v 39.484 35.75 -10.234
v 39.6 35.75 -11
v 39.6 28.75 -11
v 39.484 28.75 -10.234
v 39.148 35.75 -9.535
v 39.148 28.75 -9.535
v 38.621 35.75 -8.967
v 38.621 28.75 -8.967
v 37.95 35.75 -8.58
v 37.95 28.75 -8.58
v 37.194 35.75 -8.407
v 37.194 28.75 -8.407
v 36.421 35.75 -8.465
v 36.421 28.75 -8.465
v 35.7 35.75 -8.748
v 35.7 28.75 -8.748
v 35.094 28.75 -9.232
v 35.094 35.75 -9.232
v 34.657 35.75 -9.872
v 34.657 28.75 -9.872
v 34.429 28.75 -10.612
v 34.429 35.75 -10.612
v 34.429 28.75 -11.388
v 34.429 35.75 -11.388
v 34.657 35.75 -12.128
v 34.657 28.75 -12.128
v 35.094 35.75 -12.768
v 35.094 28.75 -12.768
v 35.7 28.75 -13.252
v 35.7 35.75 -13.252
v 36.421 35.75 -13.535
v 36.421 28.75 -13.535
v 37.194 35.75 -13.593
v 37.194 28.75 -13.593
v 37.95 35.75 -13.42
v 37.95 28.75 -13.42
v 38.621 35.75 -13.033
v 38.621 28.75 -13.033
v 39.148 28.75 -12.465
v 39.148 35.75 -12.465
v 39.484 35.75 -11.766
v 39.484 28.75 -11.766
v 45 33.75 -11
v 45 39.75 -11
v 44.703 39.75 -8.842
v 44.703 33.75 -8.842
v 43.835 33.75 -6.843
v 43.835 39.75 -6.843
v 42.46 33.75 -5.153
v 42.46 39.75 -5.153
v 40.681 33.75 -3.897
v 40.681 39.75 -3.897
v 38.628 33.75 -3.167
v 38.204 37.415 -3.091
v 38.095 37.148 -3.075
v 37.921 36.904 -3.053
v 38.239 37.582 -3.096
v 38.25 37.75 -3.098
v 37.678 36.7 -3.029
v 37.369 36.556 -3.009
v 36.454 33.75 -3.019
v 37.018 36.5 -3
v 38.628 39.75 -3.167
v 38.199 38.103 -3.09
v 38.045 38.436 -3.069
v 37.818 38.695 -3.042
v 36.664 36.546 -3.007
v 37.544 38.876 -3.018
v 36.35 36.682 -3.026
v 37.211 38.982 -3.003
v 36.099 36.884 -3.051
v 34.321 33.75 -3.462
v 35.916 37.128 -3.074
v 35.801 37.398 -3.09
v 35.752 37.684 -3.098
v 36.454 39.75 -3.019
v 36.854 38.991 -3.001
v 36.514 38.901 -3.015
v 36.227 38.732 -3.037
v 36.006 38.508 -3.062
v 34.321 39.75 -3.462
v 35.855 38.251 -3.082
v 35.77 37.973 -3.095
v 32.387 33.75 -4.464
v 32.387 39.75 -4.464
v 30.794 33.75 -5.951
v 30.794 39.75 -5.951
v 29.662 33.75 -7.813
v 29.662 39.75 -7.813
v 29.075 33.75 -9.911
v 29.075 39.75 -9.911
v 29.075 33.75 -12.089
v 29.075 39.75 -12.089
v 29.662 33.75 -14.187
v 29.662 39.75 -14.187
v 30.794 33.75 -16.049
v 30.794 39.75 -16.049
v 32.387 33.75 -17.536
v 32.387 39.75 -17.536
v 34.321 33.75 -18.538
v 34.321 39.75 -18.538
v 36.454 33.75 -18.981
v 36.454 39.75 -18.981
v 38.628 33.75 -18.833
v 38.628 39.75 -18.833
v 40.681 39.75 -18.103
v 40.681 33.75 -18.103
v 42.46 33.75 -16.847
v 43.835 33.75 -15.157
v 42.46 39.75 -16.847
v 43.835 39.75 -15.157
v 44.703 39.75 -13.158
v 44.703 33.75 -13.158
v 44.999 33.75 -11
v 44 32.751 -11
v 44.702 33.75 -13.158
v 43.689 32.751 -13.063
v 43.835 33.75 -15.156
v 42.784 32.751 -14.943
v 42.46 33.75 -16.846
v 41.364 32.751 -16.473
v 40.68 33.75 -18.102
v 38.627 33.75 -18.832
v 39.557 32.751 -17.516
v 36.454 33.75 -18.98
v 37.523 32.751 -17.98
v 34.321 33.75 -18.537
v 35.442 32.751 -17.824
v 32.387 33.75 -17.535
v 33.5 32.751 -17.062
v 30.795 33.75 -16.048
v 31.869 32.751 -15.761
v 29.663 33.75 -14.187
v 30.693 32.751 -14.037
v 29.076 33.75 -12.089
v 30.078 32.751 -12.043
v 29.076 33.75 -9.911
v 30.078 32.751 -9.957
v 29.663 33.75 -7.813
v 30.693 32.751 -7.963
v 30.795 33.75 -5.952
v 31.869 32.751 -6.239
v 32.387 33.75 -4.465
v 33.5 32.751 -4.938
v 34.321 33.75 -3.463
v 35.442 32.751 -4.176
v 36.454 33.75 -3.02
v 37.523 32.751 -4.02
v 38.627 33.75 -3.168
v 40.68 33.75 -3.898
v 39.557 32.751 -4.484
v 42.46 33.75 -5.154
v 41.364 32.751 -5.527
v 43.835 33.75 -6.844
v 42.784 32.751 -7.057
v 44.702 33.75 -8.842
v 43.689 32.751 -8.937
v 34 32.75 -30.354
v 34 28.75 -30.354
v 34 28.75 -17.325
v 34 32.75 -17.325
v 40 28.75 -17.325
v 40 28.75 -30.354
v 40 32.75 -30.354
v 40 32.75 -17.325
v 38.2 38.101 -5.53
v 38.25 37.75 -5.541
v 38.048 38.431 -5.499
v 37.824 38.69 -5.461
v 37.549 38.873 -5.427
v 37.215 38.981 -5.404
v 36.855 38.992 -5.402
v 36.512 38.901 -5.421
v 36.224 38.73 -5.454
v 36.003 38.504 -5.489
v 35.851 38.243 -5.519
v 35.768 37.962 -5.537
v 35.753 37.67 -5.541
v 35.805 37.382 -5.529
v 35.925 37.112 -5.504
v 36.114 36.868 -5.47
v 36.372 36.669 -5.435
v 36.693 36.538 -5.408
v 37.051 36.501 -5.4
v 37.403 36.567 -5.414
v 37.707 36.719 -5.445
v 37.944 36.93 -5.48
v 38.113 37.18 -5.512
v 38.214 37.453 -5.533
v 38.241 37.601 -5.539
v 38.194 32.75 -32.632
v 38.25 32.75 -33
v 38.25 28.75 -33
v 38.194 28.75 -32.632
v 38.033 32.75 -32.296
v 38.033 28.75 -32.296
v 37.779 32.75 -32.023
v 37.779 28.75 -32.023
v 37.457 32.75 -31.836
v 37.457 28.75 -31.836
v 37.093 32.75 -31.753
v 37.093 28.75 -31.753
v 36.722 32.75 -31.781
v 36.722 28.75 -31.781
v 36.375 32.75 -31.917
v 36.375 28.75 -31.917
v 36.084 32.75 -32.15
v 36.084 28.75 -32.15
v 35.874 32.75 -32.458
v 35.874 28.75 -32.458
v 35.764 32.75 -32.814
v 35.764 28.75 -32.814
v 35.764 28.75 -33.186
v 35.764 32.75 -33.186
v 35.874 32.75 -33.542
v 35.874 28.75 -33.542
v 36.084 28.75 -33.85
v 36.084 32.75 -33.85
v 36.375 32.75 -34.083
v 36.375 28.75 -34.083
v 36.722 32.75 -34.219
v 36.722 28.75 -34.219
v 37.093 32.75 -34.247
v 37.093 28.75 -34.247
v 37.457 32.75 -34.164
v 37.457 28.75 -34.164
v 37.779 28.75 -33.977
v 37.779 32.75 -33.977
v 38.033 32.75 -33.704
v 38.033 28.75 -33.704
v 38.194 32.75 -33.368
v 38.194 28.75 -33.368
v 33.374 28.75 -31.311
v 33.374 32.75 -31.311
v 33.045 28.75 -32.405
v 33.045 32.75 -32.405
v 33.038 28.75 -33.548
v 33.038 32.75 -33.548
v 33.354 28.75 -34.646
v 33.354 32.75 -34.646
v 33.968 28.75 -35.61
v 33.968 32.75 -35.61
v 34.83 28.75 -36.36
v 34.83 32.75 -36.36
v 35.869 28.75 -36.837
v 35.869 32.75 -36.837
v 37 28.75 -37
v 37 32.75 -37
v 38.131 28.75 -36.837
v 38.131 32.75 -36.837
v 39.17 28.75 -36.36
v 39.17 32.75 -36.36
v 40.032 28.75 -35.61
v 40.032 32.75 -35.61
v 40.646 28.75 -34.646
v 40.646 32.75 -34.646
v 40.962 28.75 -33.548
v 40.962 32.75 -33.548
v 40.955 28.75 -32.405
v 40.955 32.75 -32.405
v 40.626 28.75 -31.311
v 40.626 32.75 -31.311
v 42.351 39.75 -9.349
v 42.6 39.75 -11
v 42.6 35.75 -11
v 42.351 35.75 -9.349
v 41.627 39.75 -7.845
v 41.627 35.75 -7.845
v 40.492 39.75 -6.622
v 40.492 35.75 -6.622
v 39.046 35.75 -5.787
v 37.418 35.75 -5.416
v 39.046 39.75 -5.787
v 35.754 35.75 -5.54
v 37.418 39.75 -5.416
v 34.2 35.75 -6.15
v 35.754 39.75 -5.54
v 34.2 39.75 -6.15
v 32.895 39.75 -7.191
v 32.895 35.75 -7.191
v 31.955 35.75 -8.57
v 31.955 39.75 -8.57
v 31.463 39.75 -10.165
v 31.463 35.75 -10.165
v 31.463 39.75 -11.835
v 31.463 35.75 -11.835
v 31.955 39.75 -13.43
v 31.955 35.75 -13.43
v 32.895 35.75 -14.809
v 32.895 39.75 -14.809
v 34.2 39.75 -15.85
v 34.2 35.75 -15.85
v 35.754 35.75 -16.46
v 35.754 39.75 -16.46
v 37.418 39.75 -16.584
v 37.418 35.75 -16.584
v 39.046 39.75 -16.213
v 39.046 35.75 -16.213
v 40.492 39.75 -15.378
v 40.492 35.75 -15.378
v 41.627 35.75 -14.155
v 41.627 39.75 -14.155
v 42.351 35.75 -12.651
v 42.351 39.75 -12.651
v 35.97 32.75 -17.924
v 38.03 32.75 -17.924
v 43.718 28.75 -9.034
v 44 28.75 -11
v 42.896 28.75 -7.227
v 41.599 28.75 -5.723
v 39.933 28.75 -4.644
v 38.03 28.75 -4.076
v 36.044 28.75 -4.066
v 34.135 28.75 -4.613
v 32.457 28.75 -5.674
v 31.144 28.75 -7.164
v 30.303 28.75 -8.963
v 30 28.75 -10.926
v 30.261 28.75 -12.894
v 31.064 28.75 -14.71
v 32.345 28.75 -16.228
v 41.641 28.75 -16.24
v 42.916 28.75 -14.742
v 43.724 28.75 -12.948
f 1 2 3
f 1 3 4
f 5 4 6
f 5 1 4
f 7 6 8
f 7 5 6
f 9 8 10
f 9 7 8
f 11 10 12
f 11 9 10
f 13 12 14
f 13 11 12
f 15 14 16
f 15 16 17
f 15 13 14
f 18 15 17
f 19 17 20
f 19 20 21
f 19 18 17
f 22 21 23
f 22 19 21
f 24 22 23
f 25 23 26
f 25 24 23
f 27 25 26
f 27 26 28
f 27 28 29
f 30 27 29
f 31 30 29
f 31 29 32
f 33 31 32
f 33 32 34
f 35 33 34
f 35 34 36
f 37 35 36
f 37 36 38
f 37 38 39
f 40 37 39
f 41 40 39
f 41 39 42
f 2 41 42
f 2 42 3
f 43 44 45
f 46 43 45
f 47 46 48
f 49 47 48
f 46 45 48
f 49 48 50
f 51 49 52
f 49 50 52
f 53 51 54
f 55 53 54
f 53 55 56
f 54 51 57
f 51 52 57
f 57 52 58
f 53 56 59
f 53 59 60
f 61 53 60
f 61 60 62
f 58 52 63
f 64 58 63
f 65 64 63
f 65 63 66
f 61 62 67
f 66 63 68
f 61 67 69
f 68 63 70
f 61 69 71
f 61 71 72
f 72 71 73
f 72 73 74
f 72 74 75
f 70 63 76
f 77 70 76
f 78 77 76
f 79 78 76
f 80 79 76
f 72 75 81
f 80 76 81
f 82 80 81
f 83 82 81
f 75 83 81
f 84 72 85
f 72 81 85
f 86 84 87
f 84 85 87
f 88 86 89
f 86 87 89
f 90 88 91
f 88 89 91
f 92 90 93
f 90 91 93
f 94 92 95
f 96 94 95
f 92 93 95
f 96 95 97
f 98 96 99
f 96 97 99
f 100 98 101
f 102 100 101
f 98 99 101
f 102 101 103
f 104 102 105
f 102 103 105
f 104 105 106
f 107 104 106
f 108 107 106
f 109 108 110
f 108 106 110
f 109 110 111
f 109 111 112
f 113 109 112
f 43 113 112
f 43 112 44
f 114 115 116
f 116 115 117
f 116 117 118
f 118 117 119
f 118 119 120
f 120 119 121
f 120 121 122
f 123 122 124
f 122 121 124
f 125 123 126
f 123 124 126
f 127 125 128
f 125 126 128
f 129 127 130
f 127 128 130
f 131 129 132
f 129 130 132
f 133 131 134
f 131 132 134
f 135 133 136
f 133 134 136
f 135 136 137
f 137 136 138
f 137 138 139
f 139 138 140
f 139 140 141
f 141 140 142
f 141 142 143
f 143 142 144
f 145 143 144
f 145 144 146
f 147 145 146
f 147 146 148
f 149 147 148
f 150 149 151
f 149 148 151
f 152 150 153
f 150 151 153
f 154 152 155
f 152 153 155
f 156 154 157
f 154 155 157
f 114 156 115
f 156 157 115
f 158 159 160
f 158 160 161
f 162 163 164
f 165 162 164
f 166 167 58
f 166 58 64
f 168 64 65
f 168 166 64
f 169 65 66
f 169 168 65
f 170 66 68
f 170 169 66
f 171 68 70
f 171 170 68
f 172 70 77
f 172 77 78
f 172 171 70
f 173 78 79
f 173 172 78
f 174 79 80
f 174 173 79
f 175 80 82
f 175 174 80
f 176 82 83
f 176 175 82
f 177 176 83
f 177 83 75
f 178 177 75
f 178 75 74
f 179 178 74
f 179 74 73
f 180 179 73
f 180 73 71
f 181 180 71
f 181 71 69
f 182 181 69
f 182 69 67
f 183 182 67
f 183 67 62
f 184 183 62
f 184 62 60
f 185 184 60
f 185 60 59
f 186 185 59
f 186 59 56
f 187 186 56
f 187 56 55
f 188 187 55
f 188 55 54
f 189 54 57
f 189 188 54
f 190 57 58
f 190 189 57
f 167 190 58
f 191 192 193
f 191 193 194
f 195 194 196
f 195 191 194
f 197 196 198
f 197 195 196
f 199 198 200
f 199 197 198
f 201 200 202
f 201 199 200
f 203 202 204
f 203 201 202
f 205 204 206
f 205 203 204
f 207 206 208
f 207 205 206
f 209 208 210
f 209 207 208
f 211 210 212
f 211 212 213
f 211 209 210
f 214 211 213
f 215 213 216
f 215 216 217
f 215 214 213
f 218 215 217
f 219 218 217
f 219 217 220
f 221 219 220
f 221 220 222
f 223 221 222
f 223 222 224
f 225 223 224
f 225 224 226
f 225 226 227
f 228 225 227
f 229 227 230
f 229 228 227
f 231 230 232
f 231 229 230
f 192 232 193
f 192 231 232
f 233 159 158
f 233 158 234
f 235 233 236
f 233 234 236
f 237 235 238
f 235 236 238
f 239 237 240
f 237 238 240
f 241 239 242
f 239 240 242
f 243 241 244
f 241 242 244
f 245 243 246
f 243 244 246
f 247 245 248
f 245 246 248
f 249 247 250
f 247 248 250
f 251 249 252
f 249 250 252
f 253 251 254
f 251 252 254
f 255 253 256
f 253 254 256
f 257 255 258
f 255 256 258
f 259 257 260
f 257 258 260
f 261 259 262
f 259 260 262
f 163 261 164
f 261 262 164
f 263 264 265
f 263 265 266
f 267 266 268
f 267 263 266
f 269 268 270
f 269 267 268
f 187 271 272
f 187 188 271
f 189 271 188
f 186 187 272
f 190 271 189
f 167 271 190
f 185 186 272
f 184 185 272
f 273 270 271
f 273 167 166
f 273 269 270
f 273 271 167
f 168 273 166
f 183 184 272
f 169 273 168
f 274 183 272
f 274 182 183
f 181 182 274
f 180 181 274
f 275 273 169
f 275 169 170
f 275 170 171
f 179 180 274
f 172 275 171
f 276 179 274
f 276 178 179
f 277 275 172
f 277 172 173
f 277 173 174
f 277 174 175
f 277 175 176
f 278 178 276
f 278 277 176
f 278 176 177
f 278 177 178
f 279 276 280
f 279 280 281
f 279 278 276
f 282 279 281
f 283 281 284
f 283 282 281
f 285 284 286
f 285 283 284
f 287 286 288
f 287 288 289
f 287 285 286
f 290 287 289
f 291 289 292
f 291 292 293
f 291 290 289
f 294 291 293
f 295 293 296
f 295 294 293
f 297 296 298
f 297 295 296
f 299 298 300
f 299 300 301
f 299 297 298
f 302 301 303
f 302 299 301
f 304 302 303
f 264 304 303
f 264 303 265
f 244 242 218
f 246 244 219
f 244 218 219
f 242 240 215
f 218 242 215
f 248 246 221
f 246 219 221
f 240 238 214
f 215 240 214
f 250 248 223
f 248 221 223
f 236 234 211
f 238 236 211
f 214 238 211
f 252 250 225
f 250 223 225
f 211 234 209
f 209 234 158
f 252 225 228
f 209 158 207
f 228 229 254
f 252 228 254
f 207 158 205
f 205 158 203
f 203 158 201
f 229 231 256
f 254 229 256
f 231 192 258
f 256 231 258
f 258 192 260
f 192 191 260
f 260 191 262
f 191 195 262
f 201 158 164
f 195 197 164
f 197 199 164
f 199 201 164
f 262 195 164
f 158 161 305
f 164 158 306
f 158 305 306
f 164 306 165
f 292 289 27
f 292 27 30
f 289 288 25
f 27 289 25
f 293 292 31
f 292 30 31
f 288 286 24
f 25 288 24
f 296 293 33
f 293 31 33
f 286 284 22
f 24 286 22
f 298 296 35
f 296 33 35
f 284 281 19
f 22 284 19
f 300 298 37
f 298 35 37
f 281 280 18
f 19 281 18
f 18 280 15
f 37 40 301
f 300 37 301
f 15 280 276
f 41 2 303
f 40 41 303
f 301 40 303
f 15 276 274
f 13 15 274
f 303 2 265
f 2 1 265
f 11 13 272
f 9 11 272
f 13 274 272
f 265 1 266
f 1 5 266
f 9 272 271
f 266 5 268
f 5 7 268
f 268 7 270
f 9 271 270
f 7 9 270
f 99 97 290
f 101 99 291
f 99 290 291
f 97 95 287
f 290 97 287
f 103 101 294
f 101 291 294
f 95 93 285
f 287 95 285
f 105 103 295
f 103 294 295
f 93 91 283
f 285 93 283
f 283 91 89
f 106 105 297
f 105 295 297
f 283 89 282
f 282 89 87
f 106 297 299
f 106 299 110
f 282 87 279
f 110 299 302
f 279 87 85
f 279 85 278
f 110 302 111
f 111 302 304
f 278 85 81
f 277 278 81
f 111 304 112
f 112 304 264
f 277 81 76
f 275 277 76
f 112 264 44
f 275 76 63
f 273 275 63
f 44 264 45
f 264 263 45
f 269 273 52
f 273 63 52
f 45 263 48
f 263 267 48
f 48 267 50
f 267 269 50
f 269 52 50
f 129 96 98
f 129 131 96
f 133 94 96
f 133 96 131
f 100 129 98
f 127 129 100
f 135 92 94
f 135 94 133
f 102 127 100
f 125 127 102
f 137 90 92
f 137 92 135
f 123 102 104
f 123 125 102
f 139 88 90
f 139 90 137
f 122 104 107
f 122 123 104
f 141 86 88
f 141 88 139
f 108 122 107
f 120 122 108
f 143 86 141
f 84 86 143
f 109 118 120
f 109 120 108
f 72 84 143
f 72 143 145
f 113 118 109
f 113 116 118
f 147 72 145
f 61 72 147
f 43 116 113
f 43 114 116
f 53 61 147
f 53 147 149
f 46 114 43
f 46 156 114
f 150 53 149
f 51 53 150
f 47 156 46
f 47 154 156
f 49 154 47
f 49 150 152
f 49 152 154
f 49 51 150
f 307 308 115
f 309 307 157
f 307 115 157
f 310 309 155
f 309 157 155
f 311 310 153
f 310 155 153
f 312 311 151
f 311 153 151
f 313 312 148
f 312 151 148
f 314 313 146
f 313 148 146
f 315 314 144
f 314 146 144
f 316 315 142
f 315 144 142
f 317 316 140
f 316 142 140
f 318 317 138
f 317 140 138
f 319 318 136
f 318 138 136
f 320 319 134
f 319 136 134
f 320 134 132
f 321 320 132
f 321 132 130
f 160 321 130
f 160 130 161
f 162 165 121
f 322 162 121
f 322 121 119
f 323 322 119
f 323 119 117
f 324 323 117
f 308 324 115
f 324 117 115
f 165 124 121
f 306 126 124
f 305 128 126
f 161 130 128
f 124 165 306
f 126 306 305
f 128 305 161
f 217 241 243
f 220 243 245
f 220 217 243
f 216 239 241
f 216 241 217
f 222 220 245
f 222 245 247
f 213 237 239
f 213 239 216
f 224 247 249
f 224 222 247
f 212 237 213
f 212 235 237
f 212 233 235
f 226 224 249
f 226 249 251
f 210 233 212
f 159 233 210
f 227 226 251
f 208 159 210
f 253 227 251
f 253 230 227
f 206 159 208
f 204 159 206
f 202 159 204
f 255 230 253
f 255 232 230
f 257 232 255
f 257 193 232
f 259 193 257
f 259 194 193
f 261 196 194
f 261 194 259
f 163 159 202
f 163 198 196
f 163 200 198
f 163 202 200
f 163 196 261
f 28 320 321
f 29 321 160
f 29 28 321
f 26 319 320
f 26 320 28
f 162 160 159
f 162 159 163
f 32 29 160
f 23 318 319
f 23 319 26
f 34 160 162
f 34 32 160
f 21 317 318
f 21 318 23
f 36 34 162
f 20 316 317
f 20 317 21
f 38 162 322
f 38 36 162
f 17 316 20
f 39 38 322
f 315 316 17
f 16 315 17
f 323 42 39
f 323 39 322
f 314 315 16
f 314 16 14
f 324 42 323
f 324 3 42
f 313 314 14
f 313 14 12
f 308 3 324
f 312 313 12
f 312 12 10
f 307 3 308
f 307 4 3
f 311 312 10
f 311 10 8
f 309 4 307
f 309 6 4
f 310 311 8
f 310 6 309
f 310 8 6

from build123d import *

# Parameters (mm, degrees)
CYLINDER968_R          = 1.25
CYLINDER968_DEPTH      = 4
CYLINDER968_ROLL_ANGLE = 90
CYLINDER972_R          = 1.25
CYLINDER972_DEPTH      = 7
CYLINDER970_R          = 2.6
CYLINDER970_DEPTH      = 11
CYLINDER970_ROLL_ANGLE = 90
CYLINDER969_R          = 5.6
CYLINDER969_DEPTH      = 4
CYLINDER969_ROLL_ANGLE = 90
CYLINDER971_R          = 8
CYLINDER971_DEPTH      = 6
CYLINDER971_ROLL_ANGLE = 90
CYLINDER964_R          = 7
CYLINDER964_DEPTH      = 6
CYLINDER964_ROLL_ANGLE = 90
CYLINDER965_R          = 4
CYLINDER965_DEPTH      = 4
CYLINDER965_ROLL_ANGLE = 90
BOX564_W               = 6
BOX564_H               = 4
BOX564_DEPTH           = 22
CHAMFER105_SIZE        = 0.999


with BuildPart() as cylinder1140:
    # Cylinder968 → Cylinder968 (new body)
    with BuildSketch(Plane.XY):
        Circle(CYLINDER968_R)
    extrude(amount=CYLINDER968_DEPTH)


with BuildPart() as cylinder1140_1:
    # Cylinder968 roll: moved
    add(cylinder1140.part.rotate(Axis((0, 0, 0), (1, 0, 0)), CYLINDER968_ROLL_ANGLE))


with BuildPart() as cylinder1140_2:
    # Cylinder968 placement: moved
    add(cylinder1140_1.part.moved(Location((37, 32.75, -33))))


with BuildPart() as cylinder1144:
    # Cylinder972 → Cylinder972 (new body)
    with BuildSketch(Plane(origin=(37, 37.75, -8), x_dir=(1, 0, 0), z_dir=(0, 0, 1))):
        Circle(CYLINDER972_R)
    extrude(amount=CYLINDER972_DEPTH)


with BuildPart() as cylinder1142:
    # Cylinder970 → Cylinder970 (new body)
    with BuildSketch(Plane.XY):
        Circle(CYLINDER970_R)
    extrude(amount=CYLINDER970_DEPTH)


with BuildPart() as cylinder1142_1:
    # Cylinder970 roll: moved
    add(cylinder1142.part.rotate(Axis((0, 0, 0), (1, 0, 0)), CYLINDER970_ROLL_ANGLE))


with BuildPart() as cylinder1142_2:
    # Cylinder970 placement: moved
    add(cylinder1142_1.part.moved(Location((37, 39.75, -11))))


with BuildPart() as fusion607:
    # Cylinder969 → Cylinder969 (new body)
    with BuildSketch(Plane.XY):
        Circle(CYLINDER969_R)
    extrude(amount=CYLINDER969_DEPTH)


with BuildPart() as fusion607_1:
    # Cylinder969 roll: moved
    add(fusion607.part.rotate(Axis((0, 0, 0), (1, 0, 0)), CYLINDER969_ROLL_ANGLE))


with BuildPart() as fusion607_2:
    # Cylinder969 placement: moved
    add(fusion607_1.part.moved(Location((37, 39.75, -11))))

    # Fusion607: union Cylinder1140, Cylinder1144, Cylinder1142
    add(cylinder1140_2.part)
    add(cylinder1144.part)
    add(cylinder1142_2.part)


with BuildPart() as cylinder1143:
    # Cylinder971 → Cylinder971 (new body)
    with BuildSketch(Plane.XY):
        Circle(CYLINDER971_R)
    extrude(amount=CYLINDER971_DEPTH)


with BuildPart() as cylinder1143_1:
    # Cylinder971 roll: moved
    add(cylinder1143.part.rotate(Axis((0, 0, 0), (1, 0, 0)), CYLINDER971_ROLL_ANGLE))


with BuildPart() as cylinder1143_2:
    # Cylinder971 placement: moved
    add(cylinder1143_1.part.moved(Location((37, 39.75, -11))))


with BuildPart() as cylinder1136:
    # Cylinder964 → Cylinder964 (new body)
    with BuildSketch(Plane.XY):
        Circle(CYLINDER964_R)
    extrude(amount=CYLINDER964_DEPTH)


with BuildPart() as cylinder1136_1:
    # Cylinder964 roll: moved
    add(cylinder1136.part.rotate(Axis((0, 0, 0), (1, 0, 0)), CYLINDER964_ROLL_ANGLE))


with BuildPart() as cylinder1136_2:
    # Cylinder964 placement: moved
    add(cylinder1136_1.part.moved(Location((37, 39.75, -11))))


with BuildPart() as cylinder1137:
    # Cylinder965 → Cylinder965 (new body)
    with BuildSketch(Plane.XY):
        Circle(CYLINDER965_R)
    extrude(amount=CYLINDER965_DEPTH)


with BuildPart() as cylinder1137_1:
    # Cylinder965 roll: moved
    add(cylinder1137.part.rotate(Axis((0, 0, 0), (1, 0, 0)), CYLINDER965_ROLL_ANGLE))


with BuildPart() as cylinder1137_2:
    # Cylinder965 placement: moved
    add(cylinder1137_1.part.moved(Location((37, 37.75, -33))))


with BuildPart() as front_axle_steering_arm:
    # Box564 → Box564 (new body)
    with BuildSketch(Plane(origin=(34, 33.75, -33), x_dir=(1, 0, 0), z_dir=(0, 0, 1))):
        with Locations((3, 2)):
            Rectangle(BOX564_W, BOX564_H)
    extrude(amount=BOX564_DEPTH)

    # Fusion608: union Cylinder1136, Cylinder1137
    add(cylinder1136_2.part)
    add(cylinder1137_2.part)


with BuildPart() as front_axle_steering_arm_1:
    # Fusion608 placement: moved
    add(front_axle_steering_arm.part.moved(Location((0, -5, 0))))

    # Fusion609: union Cylinder1143
    add(cylinder1143_2.part)

    # Cut703: cut Fusion607
    add(fusion607_2.part, mode=Mode.SUBTRACT)

    # Chamfer105
    chamfer105_edges = [front_axle_steering_arm_1.edges().sort_by_distance(p)[0] for p in [
        (30, 33.75, -11),
    ]]
    chamfer(chamfer105_edges, length=CHAMFER105_SIZE)


solid = front_axle_steering_arm_1.part
